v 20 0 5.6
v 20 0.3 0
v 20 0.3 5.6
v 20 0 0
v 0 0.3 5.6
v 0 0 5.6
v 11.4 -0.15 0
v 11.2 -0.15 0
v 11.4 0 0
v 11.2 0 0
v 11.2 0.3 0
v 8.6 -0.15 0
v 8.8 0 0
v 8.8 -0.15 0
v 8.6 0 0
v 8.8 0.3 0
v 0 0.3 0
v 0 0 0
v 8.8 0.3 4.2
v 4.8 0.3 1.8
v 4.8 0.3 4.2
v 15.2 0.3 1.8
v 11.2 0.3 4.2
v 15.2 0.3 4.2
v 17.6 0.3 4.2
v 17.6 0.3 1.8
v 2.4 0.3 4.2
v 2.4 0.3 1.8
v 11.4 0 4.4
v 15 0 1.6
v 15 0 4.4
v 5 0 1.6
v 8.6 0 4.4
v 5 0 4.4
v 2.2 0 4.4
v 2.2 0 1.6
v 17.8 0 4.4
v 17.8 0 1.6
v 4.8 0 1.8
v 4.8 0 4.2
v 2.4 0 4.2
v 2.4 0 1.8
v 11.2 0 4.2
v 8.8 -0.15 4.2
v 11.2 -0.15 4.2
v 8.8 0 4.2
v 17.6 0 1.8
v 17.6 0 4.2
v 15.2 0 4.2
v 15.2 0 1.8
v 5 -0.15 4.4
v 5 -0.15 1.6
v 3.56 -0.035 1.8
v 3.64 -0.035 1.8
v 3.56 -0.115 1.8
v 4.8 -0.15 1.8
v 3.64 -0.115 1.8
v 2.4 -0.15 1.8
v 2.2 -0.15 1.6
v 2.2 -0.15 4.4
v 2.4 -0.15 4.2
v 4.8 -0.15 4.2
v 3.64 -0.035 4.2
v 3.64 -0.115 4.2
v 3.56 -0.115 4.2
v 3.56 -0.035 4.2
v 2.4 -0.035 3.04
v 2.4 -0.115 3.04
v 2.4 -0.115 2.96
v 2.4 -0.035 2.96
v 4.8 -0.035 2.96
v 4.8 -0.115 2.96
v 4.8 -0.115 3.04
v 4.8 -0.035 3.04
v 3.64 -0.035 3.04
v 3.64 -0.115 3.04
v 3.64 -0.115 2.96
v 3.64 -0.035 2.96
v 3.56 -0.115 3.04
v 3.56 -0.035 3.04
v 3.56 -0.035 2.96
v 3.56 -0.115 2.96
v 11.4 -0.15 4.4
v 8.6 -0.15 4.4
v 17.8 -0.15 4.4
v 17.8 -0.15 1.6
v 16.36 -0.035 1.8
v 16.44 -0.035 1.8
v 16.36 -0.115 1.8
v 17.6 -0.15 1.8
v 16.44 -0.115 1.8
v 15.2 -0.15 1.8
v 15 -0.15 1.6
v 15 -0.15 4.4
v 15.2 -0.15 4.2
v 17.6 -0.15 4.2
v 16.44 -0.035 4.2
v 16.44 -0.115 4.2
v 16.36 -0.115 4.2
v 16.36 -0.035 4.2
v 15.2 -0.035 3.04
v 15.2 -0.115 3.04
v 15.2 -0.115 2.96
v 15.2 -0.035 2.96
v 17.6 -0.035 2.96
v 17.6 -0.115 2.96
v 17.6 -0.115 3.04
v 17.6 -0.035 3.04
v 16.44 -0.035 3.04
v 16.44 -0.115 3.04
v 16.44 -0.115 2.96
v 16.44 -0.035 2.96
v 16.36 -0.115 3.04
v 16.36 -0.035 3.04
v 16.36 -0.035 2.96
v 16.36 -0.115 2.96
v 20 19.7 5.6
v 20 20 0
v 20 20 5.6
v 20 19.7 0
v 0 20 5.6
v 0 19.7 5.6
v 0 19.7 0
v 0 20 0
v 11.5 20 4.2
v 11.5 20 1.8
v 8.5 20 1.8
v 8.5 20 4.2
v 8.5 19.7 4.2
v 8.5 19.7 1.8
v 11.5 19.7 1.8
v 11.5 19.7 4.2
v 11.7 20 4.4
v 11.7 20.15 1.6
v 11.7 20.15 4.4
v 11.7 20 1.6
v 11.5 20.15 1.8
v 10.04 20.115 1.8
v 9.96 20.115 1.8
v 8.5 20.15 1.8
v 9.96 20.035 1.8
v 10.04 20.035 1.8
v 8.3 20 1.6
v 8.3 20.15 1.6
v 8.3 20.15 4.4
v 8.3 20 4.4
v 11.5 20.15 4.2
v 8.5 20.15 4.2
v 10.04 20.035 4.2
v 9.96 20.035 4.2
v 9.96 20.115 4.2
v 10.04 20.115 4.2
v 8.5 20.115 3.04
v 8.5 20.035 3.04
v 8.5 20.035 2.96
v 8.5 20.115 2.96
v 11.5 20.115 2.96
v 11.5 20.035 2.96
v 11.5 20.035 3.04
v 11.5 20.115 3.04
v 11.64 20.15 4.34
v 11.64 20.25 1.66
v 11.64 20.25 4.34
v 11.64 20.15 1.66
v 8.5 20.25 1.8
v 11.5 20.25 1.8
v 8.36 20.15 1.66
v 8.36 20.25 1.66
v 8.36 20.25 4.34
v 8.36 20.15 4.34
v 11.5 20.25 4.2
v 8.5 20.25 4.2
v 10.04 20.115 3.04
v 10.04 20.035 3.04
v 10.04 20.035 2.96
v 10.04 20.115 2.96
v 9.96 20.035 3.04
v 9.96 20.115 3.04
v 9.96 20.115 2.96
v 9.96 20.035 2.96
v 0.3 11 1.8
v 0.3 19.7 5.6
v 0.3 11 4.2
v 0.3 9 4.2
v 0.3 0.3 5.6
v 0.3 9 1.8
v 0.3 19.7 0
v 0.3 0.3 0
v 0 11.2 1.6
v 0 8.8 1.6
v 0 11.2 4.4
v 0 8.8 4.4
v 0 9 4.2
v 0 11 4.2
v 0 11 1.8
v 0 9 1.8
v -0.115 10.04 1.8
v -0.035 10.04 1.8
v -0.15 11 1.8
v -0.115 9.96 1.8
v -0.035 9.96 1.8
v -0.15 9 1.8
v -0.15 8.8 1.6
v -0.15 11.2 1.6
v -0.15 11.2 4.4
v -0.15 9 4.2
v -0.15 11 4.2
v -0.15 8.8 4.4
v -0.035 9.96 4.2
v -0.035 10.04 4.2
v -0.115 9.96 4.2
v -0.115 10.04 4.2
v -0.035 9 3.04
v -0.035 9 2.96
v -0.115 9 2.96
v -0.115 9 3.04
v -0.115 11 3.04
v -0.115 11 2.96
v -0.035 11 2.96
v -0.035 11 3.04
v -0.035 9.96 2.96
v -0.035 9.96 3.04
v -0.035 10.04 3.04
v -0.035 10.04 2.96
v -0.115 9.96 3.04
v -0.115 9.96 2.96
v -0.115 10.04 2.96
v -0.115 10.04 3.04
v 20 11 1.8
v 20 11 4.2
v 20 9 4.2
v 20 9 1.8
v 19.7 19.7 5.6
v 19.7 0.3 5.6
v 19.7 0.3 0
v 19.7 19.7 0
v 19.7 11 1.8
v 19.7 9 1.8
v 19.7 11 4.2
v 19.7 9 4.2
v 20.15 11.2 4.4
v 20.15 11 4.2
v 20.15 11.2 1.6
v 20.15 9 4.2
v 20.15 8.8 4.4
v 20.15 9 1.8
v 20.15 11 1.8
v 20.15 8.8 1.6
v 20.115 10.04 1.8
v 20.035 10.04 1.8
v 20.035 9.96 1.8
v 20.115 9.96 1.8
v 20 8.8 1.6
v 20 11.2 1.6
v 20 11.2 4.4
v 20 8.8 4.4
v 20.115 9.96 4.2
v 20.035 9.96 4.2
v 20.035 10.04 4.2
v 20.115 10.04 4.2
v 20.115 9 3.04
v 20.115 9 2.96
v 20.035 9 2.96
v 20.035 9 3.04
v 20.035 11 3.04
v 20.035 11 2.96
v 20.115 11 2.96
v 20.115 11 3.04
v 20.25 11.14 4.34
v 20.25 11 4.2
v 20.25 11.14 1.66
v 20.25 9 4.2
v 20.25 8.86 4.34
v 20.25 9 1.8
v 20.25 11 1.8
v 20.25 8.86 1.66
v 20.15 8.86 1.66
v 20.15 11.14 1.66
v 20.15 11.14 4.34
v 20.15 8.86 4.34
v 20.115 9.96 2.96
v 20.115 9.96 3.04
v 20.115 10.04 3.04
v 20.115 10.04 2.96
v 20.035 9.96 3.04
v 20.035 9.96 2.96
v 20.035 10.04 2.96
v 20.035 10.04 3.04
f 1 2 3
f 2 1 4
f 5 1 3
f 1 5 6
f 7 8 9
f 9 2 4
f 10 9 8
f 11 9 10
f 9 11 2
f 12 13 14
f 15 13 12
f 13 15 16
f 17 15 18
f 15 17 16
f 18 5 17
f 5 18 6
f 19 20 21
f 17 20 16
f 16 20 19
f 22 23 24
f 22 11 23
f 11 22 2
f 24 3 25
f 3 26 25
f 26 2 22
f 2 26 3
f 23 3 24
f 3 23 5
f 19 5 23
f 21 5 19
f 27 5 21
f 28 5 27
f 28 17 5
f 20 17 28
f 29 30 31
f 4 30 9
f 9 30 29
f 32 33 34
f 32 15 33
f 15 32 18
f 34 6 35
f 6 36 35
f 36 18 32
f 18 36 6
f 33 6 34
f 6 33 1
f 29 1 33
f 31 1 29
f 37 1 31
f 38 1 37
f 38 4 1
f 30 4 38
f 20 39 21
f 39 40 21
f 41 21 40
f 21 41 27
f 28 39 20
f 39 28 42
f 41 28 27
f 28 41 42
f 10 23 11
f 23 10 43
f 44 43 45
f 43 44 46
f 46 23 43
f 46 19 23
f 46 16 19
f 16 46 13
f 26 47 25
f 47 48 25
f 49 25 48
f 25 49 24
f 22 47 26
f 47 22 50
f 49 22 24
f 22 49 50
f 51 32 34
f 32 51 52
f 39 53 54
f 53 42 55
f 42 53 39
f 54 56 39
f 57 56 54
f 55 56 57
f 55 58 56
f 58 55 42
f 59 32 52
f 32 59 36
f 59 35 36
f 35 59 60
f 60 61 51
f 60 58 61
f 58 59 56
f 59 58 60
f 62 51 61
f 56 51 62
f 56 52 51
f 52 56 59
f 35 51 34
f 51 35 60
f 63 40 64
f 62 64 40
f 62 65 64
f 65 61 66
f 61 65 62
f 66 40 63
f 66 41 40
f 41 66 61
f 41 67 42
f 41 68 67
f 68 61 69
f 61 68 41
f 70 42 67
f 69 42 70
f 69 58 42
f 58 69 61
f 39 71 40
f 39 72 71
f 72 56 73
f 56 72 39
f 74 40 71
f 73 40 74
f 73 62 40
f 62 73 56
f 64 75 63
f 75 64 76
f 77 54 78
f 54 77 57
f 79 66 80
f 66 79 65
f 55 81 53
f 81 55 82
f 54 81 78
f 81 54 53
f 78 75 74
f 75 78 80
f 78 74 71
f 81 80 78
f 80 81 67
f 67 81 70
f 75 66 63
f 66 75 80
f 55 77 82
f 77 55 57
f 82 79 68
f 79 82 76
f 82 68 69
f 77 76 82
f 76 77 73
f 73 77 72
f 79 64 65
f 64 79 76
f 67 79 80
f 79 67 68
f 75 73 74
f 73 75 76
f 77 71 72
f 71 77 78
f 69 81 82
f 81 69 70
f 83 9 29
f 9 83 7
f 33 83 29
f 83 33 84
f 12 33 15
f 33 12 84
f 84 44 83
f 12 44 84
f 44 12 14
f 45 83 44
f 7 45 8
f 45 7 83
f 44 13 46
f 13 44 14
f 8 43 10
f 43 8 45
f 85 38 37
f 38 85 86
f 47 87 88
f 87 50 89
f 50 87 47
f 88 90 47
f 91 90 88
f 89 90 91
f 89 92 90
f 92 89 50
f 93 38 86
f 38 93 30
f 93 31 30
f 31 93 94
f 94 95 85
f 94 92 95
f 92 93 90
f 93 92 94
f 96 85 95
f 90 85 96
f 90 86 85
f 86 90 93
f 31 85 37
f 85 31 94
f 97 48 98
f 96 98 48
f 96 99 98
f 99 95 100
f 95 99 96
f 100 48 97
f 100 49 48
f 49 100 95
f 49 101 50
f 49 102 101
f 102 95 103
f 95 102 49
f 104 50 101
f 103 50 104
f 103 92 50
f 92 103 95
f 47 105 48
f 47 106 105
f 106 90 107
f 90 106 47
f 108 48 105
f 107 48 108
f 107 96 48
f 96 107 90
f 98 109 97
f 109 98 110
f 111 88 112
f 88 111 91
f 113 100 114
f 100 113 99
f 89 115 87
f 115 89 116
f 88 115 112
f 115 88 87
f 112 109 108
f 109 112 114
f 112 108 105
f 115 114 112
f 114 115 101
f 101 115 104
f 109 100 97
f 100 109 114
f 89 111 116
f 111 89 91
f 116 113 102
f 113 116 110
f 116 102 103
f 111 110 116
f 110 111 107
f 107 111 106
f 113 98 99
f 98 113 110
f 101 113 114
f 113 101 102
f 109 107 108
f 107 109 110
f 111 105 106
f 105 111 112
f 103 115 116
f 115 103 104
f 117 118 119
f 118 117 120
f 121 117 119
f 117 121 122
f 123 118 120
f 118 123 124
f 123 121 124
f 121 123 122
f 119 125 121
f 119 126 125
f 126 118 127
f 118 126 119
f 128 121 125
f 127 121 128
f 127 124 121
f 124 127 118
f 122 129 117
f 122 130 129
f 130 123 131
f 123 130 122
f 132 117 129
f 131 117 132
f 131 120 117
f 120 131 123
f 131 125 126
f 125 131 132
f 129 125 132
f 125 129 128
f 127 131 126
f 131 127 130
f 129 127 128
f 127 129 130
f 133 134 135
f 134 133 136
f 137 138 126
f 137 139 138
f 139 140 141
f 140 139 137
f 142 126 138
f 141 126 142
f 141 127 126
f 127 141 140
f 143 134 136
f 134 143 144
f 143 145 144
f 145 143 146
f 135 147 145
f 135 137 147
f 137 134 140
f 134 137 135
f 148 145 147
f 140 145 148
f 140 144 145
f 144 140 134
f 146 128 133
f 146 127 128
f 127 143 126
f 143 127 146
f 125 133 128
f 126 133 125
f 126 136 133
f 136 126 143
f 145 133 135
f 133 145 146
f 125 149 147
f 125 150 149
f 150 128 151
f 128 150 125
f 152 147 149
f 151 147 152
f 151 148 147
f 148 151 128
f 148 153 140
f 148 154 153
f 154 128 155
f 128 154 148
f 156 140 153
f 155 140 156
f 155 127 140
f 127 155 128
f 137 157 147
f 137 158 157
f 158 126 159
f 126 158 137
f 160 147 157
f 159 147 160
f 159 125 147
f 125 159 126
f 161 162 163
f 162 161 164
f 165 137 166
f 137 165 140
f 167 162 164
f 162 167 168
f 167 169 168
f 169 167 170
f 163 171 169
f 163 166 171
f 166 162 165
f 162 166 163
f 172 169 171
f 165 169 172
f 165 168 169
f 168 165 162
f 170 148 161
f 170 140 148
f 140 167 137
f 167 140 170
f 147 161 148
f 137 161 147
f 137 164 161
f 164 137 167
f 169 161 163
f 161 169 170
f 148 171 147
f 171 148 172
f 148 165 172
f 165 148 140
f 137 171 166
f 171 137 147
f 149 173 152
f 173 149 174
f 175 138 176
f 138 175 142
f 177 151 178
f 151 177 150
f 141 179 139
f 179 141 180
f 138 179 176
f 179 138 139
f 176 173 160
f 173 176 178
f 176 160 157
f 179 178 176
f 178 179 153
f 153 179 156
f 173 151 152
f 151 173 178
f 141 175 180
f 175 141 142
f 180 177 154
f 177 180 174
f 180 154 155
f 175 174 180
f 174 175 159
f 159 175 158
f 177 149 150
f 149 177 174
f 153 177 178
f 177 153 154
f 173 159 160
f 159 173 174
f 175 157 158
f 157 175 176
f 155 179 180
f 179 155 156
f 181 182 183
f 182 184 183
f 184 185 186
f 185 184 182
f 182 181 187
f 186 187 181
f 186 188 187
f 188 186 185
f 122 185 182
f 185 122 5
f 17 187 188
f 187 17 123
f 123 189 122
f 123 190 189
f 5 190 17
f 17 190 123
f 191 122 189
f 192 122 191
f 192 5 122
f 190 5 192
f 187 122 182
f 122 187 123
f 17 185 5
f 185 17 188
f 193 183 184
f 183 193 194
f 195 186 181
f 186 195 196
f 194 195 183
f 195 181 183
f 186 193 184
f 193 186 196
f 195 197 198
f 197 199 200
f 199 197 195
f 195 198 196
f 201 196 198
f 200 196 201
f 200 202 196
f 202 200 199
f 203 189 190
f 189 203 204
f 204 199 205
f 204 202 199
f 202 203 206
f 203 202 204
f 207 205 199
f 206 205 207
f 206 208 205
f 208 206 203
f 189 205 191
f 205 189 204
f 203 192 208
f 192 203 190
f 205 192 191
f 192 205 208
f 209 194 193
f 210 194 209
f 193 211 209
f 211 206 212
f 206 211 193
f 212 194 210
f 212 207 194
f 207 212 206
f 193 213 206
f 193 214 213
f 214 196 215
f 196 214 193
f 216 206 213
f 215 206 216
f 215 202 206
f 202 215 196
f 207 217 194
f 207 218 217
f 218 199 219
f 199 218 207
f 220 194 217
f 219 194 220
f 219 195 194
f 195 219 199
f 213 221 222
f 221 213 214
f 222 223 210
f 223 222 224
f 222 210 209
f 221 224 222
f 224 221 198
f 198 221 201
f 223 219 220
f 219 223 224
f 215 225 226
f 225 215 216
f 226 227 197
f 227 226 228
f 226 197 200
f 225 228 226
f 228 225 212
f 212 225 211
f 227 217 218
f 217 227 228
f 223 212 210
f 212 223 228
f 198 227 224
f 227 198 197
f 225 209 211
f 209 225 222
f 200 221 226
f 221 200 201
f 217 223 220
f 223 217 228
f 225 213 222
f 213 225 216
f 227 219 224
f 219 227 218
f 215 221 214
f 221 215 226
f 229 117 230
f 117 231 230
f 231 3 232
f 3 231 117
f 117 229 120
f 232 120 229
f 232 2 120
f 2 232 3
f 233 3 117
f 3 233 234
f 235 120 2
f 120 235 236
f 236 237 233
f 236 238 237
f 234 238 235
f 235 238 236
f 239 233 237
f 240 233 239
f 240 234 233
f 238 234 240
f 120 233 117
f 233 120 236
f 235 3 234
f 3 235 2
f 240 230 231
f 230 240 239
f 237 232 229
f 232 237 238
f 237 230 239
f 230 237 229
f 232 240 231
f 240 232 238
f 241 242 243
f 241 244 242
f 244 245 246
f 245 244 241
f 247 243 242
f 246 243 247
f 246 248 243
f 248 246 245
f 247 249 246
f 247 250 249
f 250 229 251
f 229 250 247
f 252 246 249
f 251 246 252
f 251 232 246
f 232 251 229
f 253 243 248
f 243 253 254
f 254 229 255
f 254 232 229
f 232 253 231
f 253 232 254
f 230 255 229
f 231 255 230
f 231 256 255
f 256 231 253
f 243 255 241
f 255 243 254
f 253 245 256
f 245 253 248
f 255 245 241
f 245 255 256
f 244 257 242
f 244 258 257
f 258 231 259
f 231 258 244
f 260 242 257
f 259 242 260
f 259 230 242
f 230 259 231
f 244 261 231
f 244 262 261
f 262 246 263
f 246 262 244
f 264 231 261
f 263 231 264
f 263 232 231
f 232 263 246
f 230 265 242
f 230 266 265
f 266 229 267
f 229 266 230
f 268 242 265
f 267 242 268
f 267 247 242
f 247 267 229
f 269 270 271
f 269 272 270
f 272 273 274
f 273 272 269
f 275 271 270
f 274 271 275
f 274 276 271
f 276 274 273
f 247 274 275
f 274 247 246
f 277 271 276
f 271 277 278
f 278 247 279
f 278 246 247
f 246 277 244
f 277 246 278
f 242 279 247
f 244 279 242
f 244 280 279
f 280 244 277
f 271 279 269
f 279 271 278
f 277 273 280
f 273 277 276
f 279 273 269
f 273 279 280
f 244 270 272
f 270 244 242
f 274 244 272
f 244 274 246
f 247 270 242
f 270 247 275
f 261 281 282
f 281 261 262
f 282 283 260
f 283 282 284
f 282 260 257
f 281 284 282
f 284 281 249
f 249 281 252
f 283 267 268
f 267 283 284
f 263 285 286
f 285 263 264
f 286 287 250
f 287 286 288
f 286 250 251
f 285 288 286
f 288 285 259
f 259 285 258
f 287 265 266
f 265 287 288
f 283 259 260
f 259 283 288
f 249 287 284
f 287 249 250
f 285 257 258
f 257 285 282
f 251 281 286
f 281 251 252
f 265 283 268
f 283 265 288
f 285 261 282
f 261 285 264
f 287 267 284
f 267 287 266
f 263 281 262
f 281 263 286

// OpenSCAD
// ============================================================
// MAQUETE CASA 12x12 m — ESCALA 1:50 (CORREÇÃO FUNDO)
// ============================================================

// ---------- DIMENSÕES GERAIS ----------
L = 20.0;  // Largura
H = 5.6;   // Altura
T = 0.3;   // Espessura da parede

// ---------- PARÂMETROS DOS BATENTES ----------
BAT_W = 0.2;  
BAT_S = 0.15; 
BAT_D = 0.1;  
CRZ_W = 0.08; 

$fn = 48;

// ============================================================
// VARIÁVEIS DE AJUSTE MANUAL
// ============================================================

// --- PAREDE FRONTAL (Y = 0) ---
F_P_W = 2.4;  F_P_H = 4.2;
F_P_X = (L - F_P_W) / 2;  
F_P_Y = 0.0;  
F_J_W = 2.4;  F_J_H = 2.4; F_J_Y = 1.8;
F_J1_X = 2.4;             
F_J2_X = L - F_J_W - 2.4; 

// --- PAREDE FUNDO (Y = L - T) ---
FUN_J_W = 3.0; FUN_J_H = 2.4; FUN_J_Y = 1.8;
FUN_J_X = (L - FUN_J_W) / 2; 

// --- PAREDE LATERAL ESQUERDA (X = 0) ---
LAT = L - 2*T;
E_J_W = 2.0; E_J_H = 2.4; E_J_Z = 1.8;
E_J_Y = (L - 2*T - E_J_W) / 2; 

// --- PAREDE LATERAL DIREITA (X = L - T) ---
D_J_W = 2.0; D_J_H = 2.4; D_J_Z = 1.8;
D_J_Y = (L - 2*T - D_J_W) / 2; 

// ============================================================
// MÓDULOS DE BATENTES (PROJETADOS PARA FORA)
// ============================================================

// Batente Plano X-Z (Frente e Fundo)
module batente_xz(w, h, t, frente=true, is_porta=false) {
    // Se for frente, projeta para -Y. Se for fundo, projeta para +Y.
    y_base = frente ? -BAT_S : 0;
    
    module anel(esp, prof) {
        if (!is_porta) translate([-esp, y_base, -esp]) cube([w + 2*esp, prof, esp]);
        translate([-esp, y_base, h]) cube([w + 2*esp, prof, esp]);
        translate([-esp, y_base, 0]) cube([esp, prof, h]);
        translate([w, y_base, 0]) cube([esp, prof, h]);
    }
    
    color("SaddleBrown") {
        anel(BAT_W, BAT_S);
        translate([0, frente ? (BAT_S - BAT_D) : BAT_S, 0])
            anel(BAT_W * 0.7, BAT_D);
            
        if (!is_porta) {
            y_cruz = y_base + (BAT_S / 2) - (CRZ_W / 2);
            translate([w/2 - CRZ_W/2, y_cruz, 0]) cube([CRZ_W, CRZ_W, h]);
            translate([0, y_cruz, h/2 - CRZ_W/2]) cube([w, CRZ_W, CRZ_W]);
        }
    }
}

// Batente Plano Y-Z (Laterais)
module batente_yz(w, h, t, esquerda=true, is_porta=false) {
    // Se for esquerda, projeta para -X. Se for direita, projeta para +X.
    x_base = esquerda ? -BAT_S : 0;
    
    module anel(esp, prof) {
        if (!is_porta) translate([x_base, -esp, -esp]) cube([prof, w + 2*esp, esp]);
        translate([x_base, -esp, h]) cube([prof, w + 2*esp, esp]);
        translate([x_base, -esp, 0]) cube([prof, esp, h]);
        translate([x_base, w, 0]) cube([prof, esp, h]);
    }
    
    color("SaddleBrown") {
        anel(BAT_W, BAT_S);
        translate([esquerda ? (BAT_S - BAT_D) : BAT_S, 0, 0])
            anel(BAT_W * 0.7, BAT_D);
            
        if (!is_porta) {
            x_cruz = x_base + (BAT_S / 2) - (CRZ_W / 2);
            translate([x_cruz, w/2 - CRZ_W/2, 0]) cube([CRZ_W, CRZ_W, h]);
            translate([x_cruz, 0, h/2 - CRZ_W/2]) cube([CRZ_W, w, CRZ_W]);
        }
    }
}

// ============================================================
// MONTAGEM DIRETA DAS PAREDES
// ============================================================

// 1. PAREDE FRONTAL (Y = 0)
color("LightBlue") {
    difference() {
        cube([L, T, H]);
        translate([F_J1_X, -1, F_J_Y]) cube([F_J_W, T+2, F_J_H]);
        translate([F_P_X,  -1, F_P_Y ]) cube([F_P_W,  T+2, F_P_H ]);
        translate([F_J2_X, -1, F_J_Y]) cube([F_J_W, T+2, F_J_H]);
    }
}
translate([F_J1_X, 0, F_J_Y]) batente_xz(F_J_W, F_J_H, T, frente=true, is_porta=false);
translate([F_P_X,  0, F_P_Y ]) batente_xz(F_P_W,  F_P_H,  T, frente=true, is_porta=true);
translate([F_J2_X, 0, F_J_Y]) batente_xz(F_J_W, F_J_H, T, frente=true, is_porta=false);


// 2. PAREDE FUNDO (Y = L - T)
translate([0, L - T, 0]) {
    color("LightBlue") {
        difference() {
            cube([L, T, H]);
            translate([FUN_J_X, -1, FUN_J_Y]) cube([FUN_J_W, T+2, FUN_J_H]);
        }
    }
    // Ajustado para colar na face externa traseira (Y global = L)
    translate([FUN_J_X, T, FUN_J_Y]) batente_xz(FUN_J_W, FUN_J_H, T, frente=false, is_porta=false);
}


// 3. PAREDE LATERAL ESQUERDA (X = 0)
translate([0, T, 0]) {
    color("LightBlue") {
        difference() {
            cube([T, LAT, H]);
            translate([-1, E_J_Y, E_J_Z]) cube([T+2, E_J_W, E_J_H]);
        }
    }
    translate([0, E_J_Y, E_J_Z]) batente_yz(E_J_W, E_J_H, T, esquerda=true, is_porta=false);
}


// 4. PAREDE LATERAL DIREITA (X = L - T)
translate([L - T, T, 0]) {
    color("LightBlue") {
        difference() {
            cube([T, LAT, H]);
            translate([-1, D_J_Y, D_J_Z]) cube([T+2, D_J_W, D_J_H]);
        }
    }
    translate([T, D_J_Y, D_J_Z]) batente_yz(D_J_W, D_J_H, T, esquerda=false, is_porta=false);
}
